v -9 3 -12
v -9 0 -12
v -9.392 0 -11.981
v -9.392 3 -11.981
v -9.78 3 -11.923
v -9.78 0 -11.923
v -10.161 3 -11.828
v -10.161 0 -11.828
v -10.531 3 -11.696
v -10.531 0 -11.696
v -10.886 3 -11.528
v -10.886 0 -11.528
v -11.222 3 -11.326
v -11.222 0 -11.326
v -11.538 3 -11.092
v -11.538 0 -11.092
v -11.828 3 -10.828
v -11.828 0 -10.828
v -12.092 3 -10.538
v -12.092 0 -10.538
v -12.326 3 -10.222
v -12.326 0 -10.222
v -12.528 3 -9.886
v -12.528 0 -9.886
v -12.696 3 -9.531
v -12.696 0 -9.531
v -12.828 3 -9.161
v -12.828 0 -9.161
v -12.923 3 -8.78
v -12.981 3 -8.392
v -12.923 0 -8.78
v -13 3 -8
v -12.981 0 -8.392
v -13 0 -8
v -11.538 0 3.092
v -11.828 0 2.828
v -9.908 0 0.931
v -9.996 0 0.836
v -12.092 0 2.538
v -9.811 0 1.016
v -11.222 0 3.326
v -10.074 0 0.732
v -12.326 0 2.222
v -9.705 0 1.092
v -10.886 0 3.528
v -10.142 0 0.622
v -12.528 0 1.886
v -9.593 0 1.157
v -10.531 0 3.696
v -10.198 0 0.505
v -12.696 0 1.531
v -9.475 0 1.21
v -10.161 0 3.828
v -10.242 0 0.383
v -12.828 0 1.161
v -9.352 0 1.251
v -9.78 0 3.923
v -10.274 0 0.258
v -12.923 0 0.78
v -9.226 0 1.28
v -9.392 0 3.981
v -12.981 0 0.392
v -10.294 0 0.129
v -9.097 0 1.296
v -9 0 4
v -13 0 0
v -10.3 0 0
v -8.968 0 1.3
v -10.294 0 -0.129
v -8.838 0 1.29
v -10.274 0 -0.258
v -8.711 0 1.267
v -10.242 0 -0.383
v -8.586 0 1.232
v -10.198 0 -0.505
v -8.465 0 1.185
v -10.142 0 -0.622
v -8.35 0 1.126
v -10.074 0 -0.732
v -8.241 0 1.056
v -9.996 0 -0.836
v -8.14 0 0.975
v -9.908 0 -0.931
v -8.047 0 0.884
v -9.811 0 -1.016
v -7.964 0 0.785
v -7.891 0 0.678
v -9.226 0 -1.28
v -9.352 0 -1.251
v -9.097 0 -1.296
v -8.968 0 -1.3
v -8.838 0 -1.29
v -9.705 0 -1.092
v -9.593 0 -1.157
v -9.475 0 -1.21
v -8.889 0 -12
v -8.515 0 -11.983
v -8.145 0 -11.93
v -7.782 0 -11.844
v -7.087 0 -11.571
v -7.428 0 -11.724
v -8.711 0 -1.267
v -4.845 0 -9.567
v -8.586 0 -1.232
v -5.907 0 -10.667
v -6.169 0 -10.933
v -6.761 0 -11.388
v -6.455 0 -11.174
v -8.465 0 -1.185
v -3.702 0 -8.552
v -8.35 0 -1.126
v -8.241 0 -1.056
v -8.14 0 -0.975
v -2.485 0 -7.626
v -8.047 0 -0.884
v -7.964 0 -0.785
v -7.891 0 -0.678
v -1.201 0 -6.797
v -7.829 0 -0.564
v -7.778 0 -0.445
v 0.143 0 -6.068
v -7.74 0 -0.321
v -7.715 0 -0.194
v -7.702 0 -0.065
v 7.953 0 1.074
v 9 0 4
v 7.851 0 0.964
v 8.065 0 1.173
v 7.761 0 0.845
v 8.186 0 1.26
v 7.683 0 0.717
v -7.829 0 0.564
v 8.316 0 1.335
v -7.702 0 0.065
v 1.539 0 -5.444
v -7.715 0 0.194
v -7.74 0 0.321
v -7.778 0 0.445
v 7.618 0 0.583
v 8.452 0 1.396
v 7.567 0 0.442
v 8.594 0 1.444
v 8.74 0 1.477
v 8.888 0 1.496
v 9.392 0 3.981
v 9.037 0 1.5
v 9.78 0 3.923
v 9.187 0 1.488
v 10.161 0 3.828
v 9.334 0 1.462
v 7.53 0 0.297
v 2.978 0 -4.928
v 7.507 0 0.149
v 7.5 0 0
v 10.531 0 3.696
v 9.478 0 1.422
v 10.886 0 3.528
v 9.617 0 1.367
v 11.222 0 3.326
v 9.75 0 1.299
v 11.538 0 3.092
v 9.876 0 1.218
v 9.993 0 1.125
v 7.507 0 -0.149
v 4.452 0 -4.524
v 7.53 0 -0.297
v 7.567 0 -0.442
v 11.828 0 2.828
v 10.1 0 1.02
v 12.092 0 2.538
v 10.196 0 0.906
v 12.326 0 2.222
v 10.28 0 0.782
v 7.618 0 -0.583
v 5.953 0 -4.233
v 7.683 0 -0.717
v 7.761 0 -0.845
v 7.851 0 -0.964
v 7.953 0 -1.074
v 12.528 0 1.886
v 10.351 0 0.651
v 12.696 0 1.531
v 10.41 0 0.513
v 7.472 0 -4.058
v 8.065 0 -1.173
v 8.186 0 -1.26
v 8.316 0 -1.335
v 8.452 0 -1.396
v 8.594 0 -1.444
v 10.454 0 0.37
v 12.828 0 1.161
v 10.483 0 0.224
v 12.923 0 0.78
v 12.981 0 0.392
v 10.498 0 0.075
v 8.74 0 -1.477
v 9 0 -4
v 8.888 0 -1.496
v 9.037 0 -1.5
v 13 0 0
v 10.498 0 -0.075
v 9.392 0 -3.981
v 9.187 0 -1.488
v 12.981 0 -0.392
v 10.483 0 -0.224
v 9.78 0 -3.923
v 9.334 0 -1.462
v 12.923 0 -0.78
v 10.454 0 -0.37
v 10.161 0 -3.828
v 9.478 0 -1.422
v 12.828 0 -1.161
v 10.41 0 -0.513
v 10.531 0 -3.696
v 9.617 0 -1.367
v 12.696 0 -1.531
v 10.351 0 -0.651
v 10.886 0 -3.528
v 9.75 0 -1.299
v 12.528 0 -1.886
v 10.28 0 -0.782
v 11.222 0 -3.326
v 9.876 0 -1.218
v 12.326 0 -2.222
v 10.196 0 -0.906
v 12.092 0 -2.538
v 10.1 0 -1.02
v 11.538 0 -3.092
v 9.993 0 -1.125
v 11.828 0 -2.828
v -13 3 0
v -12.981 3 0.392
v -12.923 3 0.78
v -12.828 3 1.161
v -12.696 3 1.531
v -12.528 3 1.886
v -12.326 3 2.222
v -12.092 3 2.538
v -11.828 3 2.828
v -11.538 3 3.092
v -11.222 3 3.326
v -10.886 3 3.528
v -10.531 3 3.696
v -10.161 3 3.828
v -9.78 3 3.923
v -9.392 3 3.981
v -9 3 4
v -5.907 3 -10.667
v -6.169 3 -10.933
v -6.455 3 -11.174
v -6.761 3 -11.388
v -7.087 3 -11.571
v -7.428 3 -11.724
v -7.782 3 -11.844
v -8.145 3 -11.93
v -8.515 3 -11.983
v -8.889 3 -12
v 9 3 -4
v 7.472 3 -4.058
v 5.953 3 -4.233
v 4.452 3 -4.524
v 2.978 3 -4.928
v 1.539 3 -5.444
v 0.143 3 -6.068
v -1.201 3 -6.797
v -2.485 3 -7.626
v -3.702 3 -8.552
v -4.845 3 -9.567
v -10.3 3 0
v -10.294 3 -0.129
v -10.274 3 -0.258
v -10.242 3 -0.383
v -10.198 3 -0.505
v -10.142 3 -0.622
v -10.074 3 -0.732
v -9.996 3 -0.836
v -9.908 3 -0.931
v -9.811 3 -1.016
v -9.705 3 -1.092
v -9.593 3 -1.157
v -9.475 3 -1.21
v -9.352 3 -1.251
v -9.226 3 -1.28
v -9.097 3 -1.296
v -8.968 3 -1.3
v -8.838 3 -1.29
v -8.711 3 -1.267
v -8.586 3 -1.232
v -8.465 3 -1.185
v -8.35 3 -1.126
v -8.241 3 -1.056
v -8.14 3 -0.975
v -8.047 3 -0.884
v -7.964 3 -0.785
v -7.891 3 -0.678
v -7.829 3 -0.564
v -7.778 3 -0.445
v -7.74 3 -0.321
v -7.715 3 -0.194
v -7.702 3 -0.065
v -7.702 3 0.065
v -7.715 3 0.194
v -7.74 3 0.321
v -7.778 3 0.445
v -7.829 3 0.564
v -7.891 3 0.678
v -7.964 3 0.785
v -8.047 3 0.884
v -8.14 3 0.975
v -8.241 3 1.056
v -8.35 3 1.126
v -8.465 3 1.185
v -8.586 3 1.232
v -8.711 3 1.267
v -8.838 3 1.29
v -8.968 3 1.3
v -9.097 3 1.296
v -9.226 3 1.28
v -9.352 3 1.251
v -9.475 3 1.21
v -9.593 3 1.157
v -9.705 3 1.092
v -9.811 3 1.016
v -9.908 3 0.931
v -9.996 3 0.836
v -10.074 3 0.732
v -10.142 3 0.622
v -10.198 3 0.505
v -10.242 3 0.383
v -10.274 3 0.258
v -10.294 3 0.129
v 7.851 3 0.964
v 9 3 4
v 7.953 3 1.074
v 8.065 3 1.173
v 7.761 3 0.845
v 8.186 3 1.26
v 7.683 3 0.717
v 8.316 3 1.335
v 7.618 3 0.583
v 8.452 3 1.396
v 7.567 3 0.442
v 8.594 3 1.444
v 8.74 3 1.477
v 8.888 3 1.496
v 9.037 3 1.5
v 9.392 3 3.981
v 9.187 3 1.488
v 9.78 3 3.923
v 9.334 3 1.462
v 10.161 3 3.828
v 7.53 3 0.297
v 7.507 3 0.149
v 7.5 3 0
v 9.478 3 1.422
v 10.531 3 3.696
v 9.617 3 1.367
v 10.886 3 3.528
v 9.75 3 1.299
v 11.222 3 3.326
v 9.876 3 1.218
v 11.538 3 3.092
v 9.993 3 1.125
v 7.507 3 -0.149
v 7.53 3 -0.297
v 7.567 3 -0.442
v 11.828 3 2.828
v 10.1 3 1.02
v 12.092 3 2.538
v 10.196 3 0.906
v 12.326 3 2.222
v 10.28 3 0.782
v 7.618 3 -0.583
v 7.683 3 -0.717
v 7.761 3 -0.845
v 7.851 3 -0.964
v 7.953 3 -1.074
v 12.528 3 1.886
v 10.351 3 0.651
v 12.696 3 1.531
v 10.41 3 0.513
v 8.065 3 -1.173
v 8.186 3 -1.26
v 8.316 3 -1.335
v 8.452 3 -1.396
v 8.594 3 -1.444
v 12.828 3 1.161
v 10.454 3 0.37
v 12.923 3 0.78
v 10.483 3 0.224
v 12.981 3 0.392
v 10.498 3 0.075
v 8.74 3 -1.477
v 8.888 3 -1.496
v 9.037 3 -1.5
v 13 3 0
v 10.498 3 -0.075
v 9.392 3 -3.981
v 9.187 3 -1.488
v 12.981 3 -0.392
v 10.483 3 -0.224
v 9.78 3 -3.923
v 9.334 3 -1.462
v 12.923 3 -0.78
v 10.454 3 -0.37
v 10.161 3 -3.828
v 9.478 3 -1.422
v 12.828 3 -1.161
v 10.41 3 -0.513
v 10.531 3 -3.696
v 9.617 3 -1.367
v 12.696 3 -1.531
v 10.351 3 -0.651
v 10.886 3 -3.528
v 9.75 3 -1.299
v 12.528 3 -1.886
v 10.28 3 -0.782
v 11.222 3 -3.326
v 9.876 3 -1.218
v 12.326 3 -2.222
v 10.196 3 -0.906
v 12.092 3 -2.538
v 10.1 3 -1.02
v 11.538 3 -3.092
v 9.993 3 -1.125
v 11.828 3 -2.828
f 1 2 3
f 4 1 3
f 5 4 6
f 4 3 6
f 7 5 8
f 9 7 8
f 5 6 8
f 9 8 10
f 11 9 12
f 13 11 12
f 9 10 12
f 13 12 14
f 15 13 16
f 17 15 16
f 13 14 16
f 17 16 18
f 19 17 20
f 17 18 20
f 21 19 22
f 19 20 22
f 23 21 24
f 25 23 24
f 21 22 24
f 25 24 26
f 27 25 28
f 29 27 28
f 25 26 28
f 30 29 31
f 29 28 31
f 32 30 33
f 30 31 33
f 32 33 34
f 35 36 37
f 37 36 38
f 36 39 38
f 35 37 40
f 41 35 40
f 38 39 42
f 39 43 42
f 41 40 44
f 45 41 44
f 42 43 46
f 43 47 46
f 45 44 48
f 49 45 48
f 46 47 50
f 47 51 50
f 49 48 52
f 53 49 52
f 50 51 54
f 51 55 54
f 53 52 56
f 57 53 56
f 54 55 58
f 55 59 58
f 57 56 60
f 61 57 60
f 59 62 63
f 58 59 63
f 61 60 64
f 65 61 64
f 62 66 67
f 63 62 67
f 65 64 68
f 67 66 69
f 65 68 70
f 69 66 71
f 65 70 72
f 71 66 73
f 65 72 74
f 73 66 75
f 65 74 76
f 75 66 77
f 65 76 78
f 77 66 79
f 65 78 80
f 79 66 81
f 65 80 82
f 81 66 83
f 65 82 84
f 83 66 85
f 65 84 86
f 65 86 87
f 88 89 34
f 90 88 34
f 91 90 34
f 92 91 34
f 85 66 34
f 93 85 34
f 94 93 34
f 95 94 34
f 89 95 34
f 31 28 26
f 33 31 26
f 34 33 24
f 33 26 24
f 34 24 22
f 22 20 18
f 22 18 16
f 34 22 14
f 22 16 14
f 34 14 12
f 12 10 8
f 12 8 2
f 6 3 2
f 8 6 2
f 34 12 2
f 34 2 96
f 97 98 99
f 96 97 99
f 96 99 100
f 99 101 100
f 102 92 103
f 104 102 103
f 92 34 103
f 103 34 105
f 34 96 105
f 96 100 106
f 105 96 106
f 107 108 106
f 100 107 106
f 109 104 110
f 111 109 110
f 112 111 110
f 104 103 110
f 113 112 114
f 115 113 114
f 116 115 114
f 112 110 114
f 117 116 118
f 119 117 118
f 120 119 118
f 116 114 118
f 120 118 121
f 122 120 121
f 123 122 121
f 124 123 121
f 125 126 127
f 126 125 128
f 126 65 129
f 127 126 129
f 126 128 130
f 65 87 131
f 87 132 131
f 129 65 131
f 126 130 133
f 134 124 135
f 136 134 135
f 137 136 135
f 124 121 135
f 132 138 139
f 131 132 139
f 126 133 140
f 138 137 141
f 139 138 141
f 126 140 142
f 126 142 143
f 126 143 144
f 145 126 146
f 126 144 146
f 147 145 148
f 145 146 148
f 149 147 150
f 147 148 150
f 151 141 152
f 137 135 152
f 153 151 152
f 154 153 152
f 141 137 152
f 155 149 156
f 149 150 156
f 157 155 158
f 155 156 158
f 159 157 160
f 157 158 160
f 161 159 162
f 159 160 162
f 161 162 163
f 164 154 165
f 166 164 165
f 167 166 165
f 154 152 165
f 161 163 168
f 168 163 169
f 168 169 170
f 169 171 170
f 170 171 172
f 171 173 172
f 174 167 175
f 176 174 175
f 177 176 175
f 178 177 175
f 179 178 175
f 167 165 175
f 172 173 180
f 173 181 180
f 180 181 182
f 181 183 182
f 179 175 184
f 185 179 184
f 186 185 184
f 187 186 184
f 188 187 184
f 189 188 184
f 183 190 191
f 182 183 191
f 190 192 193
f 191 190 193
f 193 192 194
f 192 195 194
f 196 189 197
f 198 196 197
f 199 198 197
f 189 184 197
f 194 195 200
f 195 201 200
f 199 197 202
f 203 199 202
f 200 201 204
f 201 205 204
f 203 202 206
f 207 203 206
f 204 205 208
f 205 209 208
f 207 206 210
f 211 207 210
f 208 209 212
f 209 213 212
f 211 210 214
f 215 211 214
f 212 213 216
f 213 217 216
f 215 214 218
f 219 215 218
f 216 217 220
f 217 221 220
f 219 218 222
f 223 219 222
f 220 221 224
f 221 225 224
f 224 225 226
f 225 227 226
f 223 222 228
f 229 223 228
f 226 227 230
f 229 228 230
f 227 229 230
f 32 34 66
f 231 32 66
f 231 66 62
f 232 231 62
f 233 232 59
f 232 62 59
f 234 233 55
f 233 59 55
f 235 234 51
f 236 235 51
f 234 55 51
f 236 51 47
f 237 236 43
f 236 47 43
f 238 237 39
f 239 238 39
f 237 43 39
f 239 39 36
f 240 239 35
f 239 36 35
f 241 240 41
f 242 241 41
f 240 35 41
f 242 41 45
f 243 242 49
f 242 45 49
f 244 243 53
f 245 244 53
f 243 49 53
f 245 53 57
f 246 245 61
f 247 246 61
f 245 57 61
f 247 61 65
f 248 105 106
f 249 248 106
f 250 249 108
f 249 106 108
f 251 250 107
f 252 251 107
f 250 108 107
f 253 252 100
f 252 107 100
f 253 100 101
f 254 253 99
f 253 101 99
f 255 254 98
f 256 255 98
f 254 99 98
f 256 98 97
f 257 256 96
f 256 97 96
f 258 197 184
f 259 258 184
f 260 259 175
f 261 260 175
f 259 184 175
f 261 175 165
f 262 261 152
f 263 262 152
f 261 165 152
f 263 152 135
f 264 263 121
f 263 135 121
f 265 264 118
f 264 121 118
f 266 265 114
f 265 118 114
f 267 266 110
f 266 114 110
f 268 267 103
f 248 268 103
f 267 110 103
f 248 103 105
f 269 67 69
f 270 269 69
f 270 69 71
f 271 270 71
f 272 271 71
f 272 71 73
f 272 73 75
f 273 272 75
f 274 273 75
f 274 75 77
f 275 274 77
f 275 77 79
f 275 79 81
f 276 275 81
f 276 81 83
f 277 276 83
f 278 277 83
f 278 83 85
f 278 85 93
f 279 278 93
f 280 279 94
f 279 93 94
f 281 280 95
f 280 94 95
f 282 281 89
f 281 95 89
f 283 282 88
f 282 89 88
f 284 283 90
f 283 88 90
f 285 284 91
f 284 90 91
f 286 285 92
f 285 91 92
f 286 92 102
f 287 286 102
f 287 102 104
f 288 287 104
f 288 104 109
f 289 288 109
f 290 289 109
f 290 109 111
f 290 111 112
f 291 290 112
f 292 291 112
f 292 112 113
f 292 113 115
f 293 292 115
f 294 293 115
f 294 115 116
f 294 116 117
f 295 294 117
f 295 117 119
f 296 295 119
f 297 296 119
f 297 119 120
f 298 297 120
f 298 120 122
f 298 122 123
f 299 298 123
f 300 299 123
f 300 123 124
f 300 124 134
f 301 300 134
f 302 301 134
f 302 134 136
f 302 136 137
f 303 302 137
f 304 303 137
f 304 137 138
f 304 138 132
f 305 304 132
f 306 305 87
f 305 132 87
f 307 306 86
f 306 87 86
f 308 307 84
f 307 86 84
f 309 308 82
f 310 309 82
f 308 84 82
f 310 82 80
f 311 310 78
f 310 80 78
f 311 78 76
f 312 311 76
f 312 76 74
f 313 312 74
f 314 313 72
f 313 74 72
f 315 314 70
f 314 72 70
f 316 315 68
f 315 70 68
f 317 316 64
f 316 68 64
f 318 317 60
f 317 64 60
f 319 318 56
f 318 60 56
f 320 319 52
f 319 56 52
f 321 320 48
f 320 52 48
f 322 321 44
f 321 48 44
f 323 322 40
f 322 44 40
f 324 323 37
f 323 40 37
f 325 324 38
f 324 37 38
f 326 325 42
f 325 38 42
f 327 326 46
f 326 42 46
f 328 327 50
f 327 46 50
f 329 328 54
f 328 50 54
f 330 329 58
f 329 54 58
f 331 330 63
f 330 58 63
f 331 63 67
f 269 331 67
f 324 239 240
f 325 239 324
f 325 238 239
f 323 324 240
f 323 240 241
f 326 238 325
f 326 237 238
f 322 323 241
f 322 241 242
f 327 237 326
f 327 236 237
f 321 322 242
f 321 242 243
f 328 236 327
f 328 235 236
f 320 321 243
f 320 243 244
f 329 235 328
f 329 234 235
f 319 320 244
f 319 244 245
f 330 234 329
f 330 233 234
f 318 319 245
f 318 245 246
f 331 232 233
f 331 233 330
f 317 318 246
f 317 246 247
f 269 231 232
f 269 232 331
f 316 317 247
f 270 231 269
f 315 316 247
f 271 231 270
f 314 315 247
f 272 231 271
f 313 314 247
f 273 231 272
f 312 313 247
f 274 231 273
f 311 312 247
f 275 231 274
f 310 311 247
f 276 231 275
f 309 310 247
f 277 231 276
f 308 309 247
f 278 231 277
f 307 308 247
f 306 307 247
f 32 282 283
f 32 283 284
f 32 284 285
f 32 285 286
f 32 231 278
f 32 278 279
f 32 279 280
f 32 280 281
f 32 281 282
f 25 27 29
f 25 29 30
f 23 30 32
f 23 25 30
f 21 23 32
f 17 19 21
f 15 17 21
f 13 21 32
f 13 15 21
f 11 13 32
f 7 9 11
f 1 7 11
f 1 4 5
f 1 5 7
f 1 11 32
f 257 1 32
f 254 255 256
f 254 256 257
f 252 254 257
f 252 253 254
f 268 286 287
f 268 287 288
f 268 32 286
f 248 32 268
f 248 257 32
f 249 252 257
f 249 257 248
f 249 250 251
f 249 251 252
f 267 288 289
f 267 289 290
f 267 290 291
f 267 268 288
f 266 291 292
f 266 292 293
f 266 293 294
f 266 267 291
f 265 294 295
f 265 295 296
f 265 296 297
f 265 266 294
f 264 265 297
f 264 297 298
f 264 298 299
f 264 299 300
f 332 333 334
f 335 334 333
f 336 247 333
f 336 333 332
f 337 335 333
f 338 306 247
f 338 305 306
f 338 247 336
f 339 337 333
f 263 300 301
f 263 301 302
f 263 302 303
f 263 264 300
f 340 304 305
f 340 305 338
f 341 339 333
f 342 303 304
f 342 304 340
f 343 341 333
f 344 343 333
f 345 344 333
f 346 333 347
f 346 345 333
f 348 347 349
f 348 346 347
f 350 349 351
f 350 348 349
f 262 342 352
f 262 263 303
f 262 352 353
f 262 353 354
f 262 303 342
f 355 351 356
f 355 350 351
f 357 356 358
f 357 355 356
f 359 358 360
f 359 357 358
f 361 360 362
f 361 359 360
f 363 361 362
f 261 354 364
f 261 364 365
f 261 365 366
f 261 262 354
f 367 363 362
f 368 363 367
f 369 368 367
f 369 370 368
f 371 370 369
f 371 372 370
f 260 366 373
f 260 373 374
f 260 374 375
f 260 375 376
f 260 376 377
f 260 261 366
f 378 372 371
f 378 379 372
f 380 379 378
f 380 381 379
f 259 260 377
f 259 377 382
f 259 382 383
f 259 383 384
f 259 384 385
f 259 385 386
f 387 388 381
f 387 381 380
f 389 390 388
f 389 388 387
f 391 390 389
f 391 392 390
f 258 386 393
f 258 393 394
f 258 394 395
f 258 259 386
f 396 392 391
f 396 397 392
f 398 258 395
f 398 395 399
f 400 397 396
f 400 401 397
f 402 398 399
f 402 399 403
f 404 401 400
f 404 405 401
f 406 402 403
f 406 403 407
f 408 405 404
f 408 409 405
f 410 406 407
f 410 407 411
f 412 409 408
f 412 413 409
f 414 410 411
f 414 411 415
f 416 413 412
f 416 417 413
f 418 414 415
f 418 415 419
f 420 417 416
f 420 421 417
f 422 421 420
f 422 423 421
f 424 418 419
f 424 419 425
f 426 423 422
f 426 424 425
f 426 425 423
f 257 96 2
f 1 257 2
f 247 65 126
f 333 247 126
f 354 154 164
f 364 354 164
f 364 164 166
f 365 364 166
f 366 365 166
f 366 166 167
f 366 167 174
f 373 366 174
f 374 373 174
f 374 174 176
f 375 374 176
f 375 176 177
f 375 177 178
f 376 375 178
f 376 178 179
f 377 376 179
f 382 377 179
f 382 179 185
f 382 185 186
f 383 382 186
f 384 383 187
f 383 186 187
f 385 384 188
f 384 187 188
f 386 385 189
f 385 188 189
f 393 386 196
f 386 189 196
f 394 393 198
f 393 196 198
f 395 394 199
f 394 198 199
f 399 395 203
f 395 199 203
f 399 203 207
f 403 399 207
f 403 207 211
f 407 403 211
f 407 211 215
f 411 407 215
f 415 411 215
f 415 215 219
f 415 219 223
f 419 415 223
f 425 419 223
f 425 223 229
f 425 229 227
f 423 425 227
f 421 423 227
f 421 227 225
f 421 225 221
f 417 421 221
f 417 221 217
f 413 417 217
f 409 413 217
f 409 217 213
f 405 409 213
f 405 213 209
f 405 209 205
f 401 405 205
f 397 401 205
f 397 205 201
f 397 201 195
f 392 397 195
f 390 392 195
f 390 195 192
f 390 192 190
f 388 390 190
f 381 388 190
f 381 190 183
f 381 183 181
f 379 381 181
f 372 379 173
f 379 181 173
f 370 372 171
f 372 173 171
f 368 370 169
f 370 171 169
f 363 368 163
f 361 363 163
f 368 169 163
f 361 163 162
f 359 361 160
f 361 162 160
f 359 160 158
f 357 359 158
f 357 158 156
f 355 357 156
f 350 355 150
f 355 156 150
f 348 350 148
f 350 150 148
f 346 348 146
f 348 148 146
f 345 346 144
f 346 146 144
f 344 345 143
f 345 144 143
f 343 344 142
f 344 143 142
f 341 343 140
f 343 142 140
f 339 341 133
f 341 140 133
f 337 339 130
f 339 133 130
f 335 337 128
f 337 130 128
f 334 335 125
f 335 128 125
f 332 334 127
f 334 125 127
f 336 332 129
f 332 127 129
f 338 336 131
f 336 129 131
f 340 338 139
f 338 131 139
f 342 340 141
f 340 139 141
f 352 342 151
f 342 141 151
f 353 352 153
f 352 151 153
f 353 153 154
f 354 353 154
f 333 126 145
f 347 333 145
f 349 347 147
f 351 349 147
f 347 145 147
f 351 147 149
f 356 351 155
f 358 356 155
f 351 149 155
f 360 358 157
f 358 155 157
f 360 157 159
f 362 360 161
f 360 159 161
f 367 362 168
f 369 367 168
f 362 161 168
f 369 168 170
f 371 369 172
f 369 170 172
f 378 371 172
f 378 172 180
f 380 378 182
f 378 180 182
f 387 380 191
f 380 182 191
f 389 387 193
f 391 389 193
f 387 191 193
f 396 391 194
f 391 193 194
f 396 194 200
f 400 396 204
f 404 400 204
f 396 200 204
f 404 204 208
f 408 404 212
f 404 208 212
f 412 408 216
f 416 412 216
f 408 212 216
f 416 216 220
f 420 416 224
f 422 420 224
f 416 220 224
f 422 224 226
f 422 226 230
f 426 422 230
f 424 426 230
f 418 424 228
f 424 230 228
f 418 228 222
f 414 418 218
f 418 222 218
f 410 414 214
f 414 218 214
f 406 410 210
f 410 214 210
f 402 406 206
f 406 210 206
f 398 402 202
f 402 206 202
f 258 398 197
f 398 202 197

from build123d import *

# Parameters (mm, degrees)
RESSALTO_EXTRUS_O1_DEPTH     = 3
FURO_DE_DI_METRO_3_0_3_1_D   = 3
FURO_DE_DI_METRO_2_6_2_6_1_D = 2.6


with BuildPart() as part:
    # Esboço1 → Ressalto-extrusão1 (new body)
    with BuildSketch(Plane(origin=(0, 0, 0), x_dir=(1, 0, 0), z_dir=(0, 1, 0))):
        with BuildLine():
            Line((-9, -4), (9, -4))
            ThreePointArc((9, -4), (13, 0), (9, 4))
            ThreePointArc((9, 4), (0.835034191, 5.742581416), (-5.90711985, 10.666666667))
            ThreePointArc((-5.90711985, 10.666666667), (-7.255550658, 11.651483717), (-8.88854382, 12))
            Line((-8.88854382, 12), (-9, 12))
            ThreePointArc((-9, 12), (-11.828427125, 10.828427125), (-13, 8))
            Line((-13, 8), (-13, 0))
            ThreePointArc((-13, 0), (-11.828427125, -2.828427125), (-9, -4))
        make_face()
    extrude(amount=RESSALTO_EXTRUS_O1_DEPTH)

    # Furo de diâmetro Ø3.0 (3)1 (through all)
    with Locations(Plane(origin=(0, 3, 0), x_dir=(1, 0, 0), z_dir=(0, 1, 0))):
        with Locations((9, 0)):
            Hole(FURO_DE_DI_METRO_3_0_3_1_D / 2)

    # Furo de diâmetro Ø2.6 (2.6)1 (through all)
    with Locations(Plane(origin=(0, 3, 0), x_dir=(1, 0, 0), z_dir=(0, 1, 0))):
        with Locations((-9, 0)):
            Hole(FURO_DE_DI_METRO_2_6_2_6_1_D / 2)


solid = part.part
